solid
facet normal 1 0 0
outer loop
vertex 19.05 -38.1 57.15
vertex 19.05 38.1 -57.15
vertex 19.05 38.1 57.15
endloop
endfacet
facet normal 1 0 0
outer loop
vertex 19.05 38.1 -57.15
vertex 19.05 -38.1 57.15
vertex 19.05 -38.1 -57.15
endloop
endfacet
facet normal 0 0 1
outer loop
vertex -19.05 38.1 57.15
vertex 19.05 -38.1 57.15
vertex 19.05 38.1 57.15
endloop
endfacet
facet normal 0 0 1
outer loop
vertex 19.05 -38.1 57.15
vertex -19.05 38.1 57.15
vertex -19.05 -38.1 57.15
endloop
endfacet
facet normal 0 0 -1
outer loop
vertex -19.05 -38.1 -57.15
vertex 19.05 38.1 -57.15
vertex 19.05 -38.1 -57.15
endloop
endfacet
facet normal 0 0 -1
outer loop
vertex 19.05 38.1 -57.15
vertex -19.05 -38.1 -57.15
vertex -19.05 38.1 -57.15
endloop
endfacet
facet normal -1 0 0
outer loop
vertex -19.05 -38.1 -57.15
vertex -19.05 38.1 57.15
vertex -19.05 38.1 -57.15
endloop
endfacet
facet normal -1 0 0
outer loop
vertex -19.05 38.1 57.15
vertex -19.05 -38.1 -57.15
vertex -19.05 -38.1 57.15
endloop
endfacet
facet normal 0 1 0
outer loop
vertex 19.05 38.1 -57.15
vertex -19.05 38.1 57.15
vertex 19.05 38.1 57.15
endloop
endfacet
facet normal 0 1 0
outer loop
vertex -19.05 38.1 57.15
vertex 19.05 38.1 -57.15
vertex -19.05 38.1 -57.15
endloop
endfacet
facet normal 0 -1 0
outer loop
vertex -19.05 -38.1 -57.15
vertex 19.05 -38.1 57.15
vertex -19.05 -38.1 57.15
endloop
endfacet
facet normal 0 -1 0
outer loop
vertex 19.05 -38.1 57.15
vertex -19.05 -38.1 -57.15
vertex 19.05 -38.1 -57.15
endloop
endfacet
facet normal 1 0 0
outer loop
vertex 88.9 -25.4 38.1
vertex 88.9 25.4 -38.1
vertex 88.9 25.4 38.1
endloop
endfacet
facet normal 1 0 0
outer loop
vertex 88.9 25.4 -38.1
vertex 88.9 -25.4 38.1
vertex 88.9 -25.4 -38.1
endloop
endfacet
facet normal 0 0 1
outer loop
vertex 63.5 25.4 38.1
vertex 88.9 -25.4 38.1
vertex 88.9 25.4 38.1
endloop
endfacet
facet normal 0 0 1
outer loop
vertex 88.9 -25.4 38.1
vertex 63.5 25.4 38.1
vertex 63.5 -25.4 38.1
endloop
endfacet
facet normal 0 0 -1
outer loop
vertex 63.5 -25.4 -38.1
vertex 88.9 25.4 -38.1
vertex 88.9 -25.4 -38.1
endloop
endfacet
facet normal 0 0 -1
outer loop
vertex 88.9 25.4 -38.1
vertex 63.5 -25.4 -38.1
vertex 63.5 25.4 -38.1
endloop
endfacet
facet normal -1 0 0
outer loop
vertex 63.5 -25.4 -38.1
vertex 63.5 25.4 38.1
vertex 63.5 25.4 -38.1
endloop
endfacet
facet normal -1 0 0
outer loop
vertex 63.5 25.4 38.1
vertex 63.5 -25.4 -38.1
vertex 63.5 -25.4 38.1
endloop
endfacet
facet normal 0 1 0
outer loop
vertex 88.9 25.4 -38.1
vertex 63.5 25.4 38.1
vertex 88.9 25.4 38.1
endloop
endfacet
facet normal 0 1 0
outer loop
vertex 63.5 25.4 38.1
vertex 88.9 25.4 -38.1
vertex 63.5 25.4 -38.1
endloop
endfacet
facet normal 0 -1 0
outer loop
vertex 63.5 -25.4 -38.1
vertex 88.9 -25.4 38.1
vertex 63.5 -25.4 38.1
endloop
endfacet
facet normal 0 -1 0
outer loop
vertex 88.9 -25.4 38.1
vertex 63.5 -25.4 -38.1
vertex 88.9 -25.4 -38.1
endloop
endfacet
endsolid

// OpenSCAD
// file: ../lib/DbgCtxStrLib1.scad
// DbgCtxStrLib1.0
// 
// Library for dealing with 'debug context strings' (usually 'dbgctxstr').

function dbgctxstr_errmsg_suffix(dbgctxstr) =
	is_undef(dbgctxstr) || dbgctxstr == "" ? "" :
	str(" (", dbgctxstr, ")");
// file: ../lib/TOGUnitTable-v1.scad
// TOGUnitTable-v1.1.0 - Library for handling 'complex amounts' in the form of [multiplier, unit name], e.g. [1.5, "inch"]
//
// 2023-07-01: the following 'annotation' is something I just made up,
// but is intended as a way for future packaging tools to know that it's 'safe'
// (because everything has been somewhat namespaced) to turn a `use <x>`
// into an `include <x>`, making it inlinable:
// safe-to-include: true
// 
// Versions:
// v1.0.0:
// - Created it.
// v1.1.0:
// - Add optional 'dbgctxstr' parameter to unit decoding functions, for better error messages
// 
// Naming convention:
// Doing 'OO without classes', here.
// Fully qualified name = class or package name + "__" + member name
// Class or package name may itself be namespaced, and class names may double as package names.
// Here, tog_unittable names both a class and a package.

// Demo unit table uses 'micrometer' as the base unit
// in order to keep multipliers as integers as much as possible.
tog_unittable__demo_unit_table = [
	["um",    [    1   ,   "um"], "micrometer" ],
	["mm",    [ 1000   ,   "um"], "millimeter" ],
	["inch",  [25400   ,   "um"], "inch"       ],
	["u",     [    1/16, "inch"], "model unit" ], // As used by TGx9 et al
	["atom",  [    8   ,    "u"], "model atom" ],
	["chunk", [    3   , "atom"], "model chunk"],
];

use <./DbgCtxStrLib1.scad>

function tog_unittable__list__filter(list, predicate) = [
	for( item=list ) if( predicate(item) ) item
];
function tog_unittable__list__first(list, on_error) =
	len(list) > 0 ? list[0] : on_error();

function tog_unittable__unit_value_ca(unit_table, unit_name, dbgctxstr=undef) =
	tog_unittable__list__first(
		tog_unittable__list__filter(unit_table, function (entry) entry[0] == unit_name),
		function () assert(false,
			str("Did not find entry for unit '", unit_name, "' in unit table", dbgctxstr_errmsg_suffix(dbgctxstr))
		)
	)[1];

function tog_unittable__ca__is_valid( ca ) =
	is_list(ca) && len(ca) == 2;

// Break down 'amount' until it is in a base unit (one which is defined in terms of itself)
function tog_unittable__simplify_ca(unit_table, amount, dbgctxstr=undef) =
	assert( tog_unittable__ca__is_valid(amount), str(amount, " is not a valid Complex Amount (should be [numeric_value, \"unit_name\"])", dbgctxstr=dbgctxstr) )
	let( unit_value_ca = tog_unittable__unit_value_ca(unit_table, amount[1], dbgctxstr=dbgctxstr) )
	unit_value_ca[1] == amount[1] ? amount :
		tog_unittable__simplify_ca(unit_table, [amount[0] * unit_value_ca[0], unit_value_ca[1]]);

function tog_unittable__divide_ca(unit_table, numerator, denominator, dbgctxstr=undef) =
	let(
		numerator_base_ca   = tog_unittable__simplify_ca(unit_table, numerator, dbgctxstr=dbgctxstr),
		denominator_base_ca = tog_unittable__simplify_ca(unit_table, denominator, dbgctxstr=dbgctxstr)
	)
	assert(numerator_base_ca[1] == denominator_base_ca[1], str("Different base units found for ", numerator[1], " and ", denominator[1]))
	numerator_base_ca[0] / denominator_base_ca[0];	

assert(tog_unittable__divide_ca(tog_unittable__demo_unit_table, [1,   "mm"], [  1, "mm"]) ==     1   );
assert(tog_unittable__divide_ca(tog_unittable__demo_unit_table, [1,   "mm"], [  1, "um"]) ==  1000   );
assert(tog_unittable__divide_ca(tog_unittable__demo_unit_table, [1, "inch"], [  1, "um"]) == 25400   );
assert(tog_unittable__divide_ca(tog_unittable__demo_unit_table, [1, "inch"], [  1, "mm"]) ==    25.4 );
assert(tog_unittable__divide_ca(tog_unittable__demo_unit_table, [1, "inch"], [254, "um"]) ==   100   );
assert(tog_unittable__divide_ca(tog_unittable__demo_unit_table, [1,    "u"], [  1, "um"]) ==  1587.5 );
// file: ../lib/TOGridLib3.scad
// TOGridPileLib-v3.2
// 
// HOKAY WHAT ARE THE COMMON
// things that I want the library to do?
// 
// - [X] Be `include`-able, to make inlining easy
// - [X] Allow unit table to be overridden easily, but default by default
// - [ ] Support common configurations by name (e.g. "V9", or some "WSTYPE-...")
//   without having to pass 50 different parameters in
// - [ ] Support subtractions for those common configurations also,
//   such that you don't need to remember to 'do less rounding', etc.
// - [ ] Make a simple foot-only block that I can subtract stuff from
//   params: foot style
// - [ ] Make a block with a lip
// - [ ] Make a block foot, and I'll intersect it with some other things
// - [X] Translate a block_size_ca to mm
// 
// Changes:
// v3.1:
// - s/togridpile3_decode_size/togridpile3_decode_vector/
// v3.2:
// - togridpile3_decode(num) = num
// v3.3:
// - Change prefix from `togridpile3` to `togridlib3`

use <../lib/TOGUnitTable-v1.scad>

function togridlib3_map(arr, fn) = [ for(item=arr) fn(item) ];

togridlib3_default_unit_table = [
	["um",    [    1,               "um"]],
	["mm",    [ 1000,               "um"]],
	["inch",  [25400,               "um"]],
	["u",     [    1.5875,          "mm"]],
	["atom",  [    8,                "u"]],
	["chunk", [    3,             "atom"]],
	["tgp-standard-bevel"   , [2,    "u"]], // Usuually 1/8"
	["m-outer-corner-radius", [4,    "u"]],
	["f-outer-corner-radius", [3,    "u"]],
];

function togridlib3_get_default_unit_table() = togridlib3_default_unit_table;
function togridlib3_get_unit_table() = is_undef($togridlib3_unit_table) ? togridlib3_default_unit_table : $togridlib3_unit_table;

function togridlib3_decode(dim, unit_table=togridlib3_get_unit_table(), unit=[1, "mm"]) =
	is_num(dim) ? dim : tog_unittable__divide_ca(unit_table, dim, unit);
function togridlib3_decode_vector(size, unit_table=togridlib3_get_unit_table(), unit=[1, "mm"]) =
	togridlib3_map(size, function(dim) is_num(dim) ? dim : tog_unittable__divide_ca(unit_table, dim, unit));

module togridlib3_cube(size, offset=0) {
	cube(togridlib3_decode_vector(size), center=true);
}
// main file
use <../lib/TOGridLib3.scad>

// Using default unit table (may give a warning):
togridlib3_cube(
	[[1, "chunk"], [2, "chunk"], [3, "chunk"]]
);

alternate_unit_table = [
	["chunk", [2, "atom"]],
	each togridlib3_get_default_unit_table()
];

// Using explicit unit table
translate([76.2, 0, 0]) togridlib3_cube(
	[[1, "chunk"], [2, "chunk"], [3, "chunk"]],
	$togridlib3_unit_table = alternate_unit_table
);
